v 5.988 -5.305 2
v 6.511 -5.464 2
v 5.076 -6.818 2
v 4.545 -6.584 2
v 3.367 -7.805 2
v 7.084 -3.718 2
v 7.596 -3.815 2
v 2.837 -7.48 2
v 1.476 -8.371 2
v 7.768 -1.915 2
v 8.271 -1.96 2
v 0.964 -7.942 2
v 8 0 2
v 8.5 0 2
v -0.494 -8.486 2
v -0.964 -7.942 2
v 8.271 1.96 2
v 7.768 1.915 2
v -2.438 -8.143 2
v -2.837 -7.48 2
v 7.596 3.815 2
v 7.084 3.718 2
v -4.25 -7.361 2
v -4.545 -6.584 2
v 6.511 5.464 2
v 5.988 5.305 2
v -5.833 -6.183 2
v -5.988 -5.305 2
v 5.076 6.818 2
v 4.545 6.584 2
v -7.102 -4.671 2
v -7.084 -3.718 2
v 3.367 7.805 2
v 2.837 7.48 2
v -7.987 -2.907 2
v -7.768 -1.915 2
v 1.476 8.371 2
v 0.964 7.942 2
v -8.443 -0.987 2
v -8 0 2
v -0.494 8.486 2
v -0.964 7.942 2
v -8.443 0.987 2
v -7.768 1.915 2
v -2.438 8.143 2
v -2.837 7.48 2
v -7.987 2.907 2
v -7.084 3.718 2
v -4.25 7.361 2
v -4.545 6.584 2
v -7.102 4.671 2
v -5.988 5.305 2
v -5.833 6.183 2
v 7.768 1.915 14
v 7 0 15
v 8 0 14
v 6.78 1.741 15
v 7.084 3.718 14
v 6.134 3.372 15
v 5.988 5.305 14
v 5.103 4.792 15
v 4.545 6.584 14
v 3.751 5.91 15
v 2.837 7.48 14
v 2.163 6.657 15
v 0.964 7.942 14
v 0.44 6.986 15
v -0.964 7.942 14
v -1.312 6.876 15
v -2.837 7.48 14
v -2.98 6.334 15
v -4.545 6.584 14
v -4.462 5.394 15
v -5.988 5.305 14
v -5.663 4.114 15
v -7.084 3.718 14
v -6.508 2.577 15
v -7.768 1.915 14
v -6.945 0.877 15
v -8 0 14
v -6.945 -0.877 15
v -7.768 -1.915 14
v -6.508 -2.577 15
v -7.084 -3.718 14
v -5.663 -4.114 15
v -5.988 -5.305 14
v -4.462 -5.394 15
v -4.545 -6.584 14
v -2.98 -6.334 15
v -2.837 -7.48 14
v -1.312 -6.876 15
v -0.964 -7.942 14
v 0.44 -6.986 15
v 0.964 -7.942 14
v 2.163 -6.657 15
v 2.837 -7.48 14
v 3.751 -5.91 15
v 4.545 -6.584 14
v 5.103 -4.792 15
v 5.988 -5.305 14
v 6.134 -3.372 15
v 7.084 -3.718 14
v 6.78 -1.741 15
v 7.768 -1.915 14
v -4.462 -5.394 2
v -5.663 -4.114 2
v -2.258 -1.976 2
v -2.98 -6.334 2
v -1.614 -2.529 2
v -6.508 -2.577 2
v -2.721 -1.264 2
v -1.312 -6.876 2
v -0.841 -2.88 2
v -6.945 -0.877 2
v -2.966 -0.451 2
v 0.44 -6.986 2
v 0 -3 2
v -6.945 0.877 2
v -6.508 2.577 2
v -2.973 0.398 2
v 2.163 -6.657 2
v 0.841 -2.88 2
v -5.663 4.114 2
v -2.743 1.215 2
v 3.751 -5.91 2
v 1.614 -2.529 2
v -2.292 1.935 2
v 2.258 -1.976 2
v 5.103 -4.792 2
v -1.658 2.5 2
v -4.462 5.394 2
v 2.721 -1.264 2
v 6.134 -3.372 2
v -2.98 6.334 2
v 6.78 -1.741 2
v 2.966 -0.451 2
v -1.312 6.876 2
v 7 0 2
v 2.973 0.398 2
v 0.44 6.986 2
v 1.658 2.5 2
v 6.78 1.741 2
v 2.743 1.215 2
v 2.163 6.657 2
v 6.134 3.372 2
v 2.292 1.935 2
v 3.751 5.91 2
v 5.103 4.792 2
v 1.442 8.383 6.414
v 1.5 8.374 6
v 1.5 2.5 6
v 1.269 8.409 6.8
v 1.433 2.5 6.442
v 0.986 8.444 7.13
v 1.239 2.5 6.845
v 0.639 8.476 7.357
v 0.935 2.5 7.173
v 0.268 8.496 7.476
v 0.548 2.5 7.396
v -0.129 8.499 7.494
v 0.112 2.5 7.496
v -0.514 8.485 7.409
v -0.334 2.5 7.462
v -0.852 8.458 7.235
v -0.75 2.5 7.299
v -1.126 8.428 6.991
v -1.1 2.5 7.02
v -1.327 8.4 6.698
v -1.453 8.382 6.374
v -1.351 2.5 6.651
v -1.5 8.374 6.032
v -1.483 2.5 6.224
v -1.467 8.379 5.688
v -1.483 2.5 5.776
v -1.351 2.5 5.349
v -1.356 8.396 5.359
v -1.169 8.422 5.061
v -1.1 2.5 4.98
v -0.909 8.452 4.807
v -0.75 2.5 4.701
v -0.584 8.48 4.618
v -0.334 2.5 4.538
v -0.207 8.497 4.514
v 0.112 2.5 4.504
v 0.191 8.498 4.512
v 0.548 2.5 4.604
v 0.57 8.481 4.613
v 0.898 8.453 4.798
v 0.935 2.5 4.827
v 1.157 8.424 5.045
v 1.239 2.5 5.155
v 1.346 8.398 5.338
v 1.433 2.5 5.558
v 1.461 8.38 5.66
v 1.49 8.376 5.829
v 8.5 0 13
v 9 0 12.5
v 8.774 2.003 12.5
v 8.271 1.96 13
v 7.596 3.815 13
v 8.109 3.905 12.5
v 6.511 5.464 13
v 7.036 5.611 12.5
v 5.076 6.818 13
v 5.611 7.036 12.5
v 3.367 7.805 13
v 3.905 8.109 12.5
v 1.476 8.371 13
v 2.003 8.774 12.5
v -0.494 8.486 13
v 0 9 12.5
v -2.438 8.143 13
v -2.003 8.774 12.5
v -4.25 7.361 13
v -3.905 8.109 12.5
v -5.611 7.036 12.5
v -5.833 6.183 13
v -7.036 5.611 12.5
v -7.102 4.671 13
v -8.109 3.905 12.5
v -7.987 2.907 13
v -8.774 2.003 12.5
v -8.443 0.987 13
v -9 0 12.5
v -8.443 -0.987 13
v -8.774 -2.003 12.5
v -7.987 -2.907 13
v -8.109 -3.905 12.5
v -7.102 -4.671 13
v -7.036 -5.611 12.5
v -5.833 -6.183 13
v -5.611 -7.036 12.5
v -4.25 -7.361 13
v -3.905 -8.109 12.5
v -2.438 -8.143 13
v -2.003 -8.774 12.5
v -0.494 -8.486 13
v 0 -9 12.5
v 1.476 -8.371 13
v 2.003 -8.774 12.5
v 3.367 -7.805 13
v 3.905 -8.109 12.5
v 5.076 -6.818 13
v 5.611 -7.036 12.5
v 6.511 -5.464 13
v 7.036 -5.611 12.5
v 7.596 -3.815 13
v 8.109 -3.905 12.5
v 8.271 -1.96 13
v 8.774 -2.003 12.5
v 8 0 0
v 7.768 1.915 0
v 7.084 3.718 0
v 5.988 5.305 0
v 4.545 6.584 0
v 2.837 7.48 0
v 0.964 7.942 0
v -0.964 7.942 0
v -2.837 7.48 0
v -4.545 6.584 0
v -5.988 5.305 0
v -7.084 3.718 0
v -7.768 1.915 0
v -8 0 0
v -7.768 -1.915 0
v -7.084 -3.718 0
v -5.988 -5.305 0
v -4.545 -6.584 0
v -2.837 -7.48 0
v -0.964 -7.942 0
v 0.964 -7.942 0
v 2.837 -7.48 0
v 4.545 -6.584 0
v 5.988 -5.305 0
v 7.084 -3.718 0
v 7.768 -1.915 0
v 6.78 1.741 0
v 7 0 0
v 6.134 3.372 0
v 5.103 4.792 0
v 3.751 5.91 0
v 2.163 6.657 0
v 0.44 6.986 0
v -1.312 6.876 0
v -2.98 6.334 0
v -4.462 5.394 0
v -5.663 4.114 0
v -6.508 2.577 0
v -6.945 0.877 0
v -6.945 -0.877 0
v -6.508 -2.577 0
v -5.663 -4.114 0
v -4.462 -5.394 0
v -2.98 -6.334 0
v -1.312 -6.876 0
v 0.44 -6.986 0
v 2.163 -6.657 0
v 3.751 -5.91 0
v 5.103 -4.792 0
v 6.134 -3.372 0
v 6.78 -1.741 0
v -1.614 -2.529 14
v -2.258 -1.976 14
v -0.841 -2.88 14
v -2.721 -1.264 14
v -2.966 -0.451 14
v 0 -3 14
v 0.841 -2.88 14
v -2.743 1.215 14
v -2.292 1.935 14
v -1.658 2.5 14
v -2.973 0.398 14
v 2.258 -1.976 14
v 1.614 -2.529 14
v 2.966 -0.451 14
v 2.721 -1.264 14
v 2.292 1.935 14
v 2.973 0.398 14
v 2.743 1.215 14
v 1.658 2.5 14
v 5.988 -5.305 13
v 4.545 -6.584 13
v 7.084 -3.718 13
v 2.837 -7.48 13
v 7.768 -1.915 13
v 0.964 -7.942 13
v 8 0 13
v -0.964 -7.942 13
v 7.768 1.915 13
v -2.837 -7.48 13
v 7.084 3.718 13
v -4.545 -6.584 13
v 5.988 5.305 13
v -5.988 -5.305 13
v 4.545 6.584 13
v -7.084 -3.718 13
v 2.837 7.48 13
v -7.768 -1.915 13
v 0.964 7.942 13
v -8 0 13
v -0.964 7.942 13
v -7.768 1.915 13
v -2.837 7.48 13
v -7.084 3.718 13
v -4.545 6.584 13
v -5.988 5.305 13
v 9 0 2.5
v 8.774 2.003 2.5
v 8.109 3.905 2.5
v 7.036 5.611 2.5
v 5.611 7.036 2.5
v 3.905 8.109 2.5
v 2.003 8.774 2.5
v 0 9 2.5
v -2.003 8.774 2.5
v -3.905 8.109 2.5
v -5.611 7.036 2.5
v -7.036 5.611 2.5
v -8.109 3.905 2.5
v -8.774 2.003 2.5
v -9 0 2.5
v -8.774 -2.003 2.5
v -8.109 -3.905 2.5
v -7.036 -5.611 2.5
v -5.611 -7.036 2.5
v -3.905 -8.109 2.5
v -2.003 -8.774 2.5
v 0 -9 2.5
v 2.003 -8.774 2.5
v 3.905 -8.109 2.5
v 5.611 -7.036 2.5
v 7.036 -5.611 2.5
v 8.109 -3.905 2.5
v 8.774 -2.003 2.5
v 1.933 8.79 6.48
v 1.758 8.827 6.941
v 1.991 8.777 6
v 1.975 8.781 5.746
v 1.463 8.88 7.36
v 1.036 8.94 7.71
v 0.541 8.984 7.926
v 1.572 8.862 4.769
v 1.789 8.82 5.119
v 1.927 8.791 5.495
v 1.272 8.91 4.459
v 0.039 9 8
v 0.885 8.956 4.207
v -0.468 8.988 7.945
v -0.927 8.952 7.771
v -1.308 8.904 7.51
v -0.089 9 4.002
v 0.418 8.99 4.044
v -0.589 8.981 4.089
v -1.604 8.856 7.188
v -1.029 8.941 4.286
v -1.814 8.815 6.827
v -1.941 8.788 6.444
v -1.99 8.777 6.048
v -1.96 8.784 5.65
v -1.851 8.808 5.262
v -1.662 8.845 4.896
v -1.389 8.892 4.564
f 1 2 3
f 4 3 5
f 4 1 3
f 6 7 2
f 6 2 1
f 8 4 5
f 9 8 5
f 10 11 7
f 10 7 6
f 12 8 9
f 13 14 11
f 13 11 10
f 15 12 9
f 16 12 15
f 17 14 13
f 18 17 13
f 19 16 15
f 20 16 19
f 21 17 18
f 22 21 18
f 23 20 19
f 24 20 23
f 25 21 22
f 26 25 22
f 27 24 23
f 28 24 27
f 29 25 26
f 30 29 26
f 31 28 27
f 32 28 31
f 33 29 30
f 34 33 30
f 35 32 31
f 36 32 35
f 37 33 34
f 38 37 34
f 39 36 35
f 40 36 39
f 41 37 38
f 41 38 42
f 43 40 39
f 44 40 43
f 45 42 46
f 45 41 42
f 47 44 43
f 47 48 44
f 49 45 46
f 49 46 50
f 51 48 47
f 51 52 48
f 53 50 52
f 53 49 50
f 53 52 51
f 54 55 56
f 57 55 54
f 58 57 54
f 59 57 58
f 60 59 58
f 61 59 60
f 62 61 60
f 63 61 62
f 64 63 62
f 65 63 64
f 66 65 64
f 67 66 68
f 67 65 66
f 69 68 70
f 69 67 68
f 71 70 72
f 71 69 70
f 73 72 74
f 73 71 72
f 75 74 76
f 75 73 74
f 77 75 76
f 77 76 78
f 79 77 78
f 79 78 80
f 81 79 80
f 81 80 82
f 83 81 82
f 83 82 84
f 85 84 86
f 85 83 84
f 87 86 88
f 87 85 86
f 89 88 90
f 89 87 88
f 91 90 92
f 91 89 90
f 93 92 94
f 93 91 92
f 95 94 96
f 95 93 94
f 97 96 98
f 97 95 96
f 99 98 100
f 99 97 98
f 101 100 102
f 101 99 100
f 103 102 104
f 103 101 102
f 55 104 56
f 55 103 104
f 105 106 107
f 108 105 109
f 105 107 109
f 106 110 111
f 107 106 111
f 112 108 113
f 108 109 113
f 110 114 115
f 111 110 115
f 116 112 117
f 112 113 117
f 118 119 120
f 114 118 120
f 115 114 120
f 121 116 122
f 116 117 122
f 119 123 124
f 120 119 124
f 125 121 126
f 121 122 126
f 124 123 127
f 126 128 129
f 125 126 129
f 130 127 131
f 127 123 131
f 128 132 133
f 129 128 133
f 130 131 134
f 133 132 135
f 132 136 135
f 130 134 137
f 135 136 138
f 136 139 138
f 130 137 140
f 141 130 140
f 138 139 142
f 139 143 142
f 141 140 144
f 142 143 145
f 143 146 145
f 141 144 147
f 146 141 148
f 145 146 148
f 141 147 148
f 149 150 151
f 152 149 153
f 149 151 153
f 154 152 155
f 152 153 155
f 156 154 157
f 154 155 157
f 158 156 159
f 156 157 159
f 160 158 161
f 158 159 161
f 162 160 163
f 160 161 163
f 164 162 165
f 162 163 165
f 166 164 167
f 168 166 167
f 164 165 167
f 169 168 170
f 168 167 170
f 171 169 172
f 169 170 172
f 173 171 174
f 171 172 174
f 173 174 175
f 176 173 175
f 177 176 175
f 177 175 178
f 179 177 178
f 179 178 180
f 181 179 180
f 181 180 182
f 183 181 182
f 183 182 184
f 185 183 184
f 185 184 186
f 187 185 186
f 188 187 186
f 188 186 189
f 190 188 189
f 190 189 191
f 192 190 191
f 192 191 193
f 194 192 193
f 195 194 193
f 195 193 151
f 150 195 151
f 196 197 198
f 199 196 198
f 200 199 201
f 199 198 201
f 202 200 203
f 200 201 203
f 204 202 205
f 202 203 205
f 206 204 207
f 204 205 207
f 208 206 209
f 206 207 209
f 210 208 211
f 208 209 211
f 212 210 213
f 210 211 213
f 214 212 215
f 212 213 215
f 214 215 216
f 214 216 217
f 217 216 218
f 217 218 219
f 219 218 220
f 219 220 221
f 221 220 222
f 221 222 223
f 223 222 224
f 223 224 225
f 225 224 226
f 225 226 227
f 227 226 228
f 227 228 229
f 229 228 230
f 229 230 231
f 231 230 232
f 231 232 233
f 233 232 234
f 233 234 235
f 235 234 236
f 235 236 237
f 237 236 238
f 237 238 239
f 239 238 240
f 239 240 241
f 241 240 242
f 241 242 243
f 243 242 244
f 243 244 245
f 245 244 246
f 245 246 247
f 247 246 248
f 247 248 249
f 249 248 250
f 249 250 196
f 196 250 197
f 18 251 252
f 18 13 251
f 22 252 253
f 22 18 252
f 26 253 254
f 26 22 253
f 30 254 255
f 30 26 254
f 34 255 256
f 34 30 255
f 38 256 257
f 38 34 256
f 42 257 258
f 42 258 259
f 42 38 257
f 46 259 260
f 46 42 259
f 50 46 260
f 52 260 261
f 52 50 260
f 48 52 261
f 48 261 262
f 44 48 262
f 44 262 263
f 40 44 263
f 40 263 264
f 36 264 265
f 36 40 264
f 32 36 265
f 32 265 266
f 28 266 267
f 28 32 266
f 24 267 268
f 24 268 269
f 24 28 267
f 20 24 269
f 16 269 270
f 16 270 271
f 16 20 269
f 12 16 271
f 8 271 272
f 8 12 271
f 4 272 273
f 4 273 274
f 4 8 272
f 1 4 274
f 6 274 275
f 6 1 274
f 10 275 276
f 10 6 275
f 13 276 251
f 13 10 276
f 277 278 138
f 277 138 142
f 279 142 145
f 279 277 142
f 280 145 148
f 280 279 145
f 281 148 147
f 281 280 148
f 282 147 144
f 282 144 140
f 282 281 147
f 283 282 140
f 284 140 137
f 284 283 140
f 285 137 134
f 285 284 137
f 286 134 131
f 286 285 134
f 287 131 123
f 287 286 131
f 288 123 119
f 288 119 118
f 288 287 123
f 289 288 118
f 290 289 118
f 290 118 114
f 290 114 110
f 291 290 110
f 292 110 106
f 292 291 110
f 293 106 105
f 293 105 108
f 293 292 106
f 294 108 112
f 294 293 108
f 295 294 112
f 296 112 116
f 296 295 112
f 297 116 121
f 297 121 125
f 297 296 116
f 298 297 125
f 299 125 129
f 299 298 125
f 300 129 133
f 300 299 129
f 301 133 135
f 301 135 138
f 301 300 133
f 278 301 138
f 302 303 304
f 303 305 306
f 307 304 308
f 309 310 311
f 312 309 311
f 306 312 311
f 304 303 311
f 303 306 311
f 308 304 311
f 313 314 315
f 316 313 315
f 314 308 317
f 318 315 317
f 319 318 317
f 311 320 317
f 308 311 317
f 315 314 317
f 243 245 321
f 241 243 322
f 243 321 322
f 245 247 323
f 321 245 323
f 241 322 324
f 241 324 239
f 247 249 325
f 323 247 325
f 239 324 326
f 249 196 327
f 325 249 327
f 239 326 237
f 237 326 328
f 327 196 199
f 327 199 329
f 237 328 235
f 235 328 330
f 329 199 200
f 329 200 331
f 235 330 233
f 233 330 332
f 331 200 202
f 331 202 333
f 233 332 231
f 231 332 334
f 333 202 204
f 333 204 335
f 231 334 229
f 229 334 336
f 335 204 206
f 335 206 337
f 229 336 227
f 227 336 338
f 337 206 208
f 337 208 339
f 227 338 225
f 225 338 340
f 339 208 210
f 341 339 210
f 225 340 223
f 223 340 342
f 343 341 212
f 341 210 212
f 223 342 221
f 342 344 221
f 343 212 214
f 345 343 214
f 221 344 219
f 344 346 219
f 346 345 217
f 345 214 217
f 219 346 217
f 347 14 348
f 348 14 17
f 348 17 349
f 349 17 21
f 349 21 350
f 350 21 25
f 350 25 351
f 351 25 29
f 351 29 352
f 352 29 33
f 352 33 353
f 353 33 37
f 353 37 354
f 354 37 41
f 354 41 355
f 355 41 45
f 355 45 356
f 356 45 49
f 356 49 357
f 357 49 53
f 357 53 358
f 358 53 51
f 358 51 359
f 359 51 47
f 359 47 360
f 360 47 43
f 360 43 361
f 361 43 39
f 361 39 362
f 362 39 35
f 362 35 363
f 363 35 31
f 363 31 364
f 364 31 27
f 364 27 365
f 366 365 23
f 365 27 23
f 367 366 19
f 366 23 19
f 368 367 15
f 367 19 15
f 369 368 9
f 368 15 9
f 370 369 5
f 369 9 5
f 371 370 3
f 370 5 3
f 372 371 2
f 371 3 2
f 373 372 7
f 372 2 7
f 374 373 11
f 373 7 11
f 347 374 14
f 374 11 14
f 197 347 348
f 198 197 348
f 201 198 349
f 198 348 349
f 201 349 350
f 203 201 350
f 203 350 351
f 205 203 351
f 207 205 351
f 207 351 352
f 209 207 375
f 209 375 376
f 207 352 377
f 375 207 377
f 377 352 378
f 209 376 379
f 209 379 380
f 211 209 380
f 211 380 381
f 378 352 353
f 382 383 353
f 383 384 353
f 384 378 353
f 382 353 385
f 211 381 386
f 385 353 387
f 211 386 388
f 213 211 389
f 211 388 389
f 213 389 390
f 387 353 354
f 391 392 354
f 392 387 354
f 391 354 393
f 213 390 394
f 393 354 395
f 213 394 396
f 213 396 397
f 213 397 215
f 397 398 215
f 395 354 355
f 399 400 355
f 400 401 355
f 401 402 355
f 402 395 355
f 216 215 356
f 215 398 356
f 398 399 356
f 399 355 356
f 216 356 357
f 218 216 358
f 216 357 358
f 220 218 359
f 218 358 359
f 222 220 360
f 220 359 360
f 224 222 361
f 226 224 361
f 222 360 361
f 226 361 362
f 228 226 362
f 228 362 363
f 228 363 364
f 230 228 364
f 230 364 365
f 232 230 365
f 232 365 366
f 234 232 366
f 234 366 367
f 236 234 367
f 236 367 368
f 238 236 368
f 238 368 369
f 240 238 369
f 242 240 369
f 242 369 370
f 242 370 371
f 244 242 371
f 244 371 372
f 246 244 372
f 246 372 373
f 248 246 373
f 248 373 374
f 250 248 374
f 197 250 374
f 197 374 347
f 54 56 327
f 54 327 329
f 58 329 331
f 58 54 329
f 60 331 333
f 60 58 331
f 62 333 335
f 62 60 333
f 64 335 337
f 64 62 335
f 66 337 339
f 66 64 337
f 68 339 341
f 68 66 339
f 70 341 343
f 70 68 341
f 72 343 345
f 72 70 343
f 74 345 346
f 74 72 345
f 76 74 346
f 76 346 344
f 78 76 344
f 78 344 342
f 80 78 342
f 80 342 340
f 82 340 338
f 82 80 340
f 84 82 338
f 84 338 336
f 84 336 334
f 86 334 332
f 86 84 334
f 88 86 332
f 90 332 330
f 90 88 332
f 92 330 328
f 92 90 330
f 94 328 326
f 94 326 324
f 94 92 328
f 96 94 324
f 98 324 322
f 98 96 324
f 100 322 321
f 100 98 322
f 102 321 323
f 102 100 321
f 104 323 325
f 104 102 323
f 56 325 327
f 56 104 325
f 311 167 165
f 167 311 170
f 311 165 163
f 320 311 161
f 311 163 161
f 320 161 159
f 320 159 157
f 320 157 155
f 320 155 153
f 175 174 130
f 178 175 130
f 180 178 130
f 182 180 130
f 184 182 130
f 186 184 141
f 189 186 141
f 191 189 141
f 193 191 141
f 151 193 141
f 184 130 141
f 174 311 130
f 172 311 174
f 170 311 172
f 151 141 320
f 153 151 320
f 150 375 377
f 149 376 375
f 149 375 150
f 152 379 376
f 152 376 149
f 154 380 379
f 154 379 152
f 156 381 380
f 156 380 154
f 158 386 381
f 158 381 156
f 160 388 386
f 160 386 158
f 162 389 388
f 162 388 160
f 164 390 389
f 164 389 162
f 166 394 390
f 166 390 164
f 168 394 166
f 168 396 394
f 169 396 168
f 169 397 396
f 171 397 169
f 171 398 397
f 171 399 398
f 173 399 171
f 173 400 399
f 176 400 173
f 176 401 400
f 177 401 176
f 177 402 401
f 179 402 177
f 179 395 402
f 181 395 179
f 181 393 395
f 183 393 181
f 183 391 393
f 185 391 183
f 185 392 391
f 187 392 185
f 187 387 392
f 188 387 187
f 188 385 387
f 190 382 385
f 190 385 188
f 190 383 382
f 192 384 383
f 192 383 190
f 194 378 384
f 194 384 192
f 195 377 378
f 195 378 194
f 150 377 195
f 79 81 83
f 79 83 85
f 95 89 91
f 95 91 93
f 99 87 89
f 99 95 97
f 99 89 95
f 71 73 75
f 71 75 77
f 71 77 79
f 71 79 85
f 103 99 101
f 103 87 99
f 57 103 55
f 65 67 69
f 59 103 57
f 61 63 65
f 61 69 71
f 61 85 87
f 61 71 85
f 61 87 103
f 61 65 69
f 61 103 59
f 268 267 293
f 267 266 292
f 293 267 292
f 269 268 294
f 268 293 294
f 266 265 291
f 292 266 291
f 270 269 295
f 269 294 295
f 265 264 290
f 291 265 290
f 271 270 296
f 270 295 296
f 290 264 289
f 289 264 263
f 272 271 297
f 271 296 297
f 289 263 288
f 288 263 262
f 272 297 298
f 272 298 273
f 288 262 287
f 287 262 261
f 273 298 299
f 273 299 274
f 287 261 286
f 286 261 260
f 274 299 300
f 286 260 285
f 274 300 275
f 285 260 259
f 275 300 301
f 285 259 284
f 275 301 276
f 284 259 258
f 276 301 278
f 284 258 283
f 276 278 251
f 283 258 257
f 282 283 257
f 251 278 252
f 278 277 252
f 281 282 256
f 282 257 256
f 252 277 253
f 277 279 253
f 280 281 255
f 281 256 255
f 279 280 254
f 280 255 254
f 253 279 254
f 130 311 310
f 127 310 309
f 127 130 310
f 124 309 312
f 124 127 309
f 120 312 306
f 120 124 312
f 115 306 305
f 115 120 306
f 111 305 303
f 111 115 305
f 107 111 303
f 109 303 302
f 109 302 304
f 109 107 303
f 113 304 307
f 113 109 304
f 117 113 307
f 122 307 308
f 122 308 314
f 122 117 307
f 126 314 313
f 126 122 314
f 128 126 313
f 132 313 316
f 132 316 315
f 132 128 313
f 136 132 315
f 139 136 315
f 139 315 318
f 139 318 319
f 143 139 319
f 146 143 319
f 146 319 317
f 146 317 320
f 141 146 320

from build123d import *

# Parameters (mm, degrees)
SKETCH_R        = 9
PAD_DEPTH       = 15
POCKET_DEPTH    = 14
SKETCH002_R     = 7
POCKET001_DEPTH = 2
SKETCH003_R     = 1.5
POCKET002_DEPTH = 9.001
SKETCH004_W     = 1
SKETCH004_H     = 2
CHAMFER_SIZE    = 1
CHAMFER001_SIZE = 0.5


with BuildPart() as part:
    # Sketch → Pad (new body)
    with BuildSketch(Plane.XY):
        Circle(SKETCH_R)
    extrude(amount=PAD_DEPTH)

    # Sketch001 → Pocket (cut)
    with BuildSketch(Plane.XY):
        with BuildLine():
            ThreePointArc((-1.658312, 2.5), (0, -3), (1.658312, 2.5))
            Line((-1.658312, 2.5), (1.658312, 2.5))
        make_face()
    extrude(amount=POCKET_DEPTH, mode=Mode.SUBTRACT)

    # Sketch002 → Pocket001 (cut)
    with BuildSketch(Plane.XY):
        Circle(SKETCH002_R)
    extrude(amount=POCKET001_DEPTH, mode=Mode.SUBTRACT)

    # Sketch003 → Pocket002 (cut, through all)
    with BuildSketch(Plane.XZ):
        with Locations((0, 6)):
            Circle(SKETCH003_R)
    extrude(amount=-POCKET002_DEPTH, mode=Mode.SUBTRACT)

    # Sketch004 → Groove (revolve, cut)
    with BuildSketch(Plane.XZ):
        with Locations((8.5, 14)):
            Rectangle(SKETCH004_W, SKETCH004_H)
        with Locations((8.5, 1)):
            Rectangle(SKETCH004_W, SKETCH004_H)
    revolve(axis=Axis((0, 0, 0), (0, 0, 1)), mode=Mode.SUBTRACT)

    # Chamfer
    chamfer_edges = [part.edges().sort_by_distance(p)[0] for p in [
        (-8, 0, 15),
    ]]
    chamfer(chamfer_edges, length=CHAMFER_SIZE)

    # Chamfer001
    chamfer001_edges = [part.edges().sort_by_distance(p)[0] for p in [
        (-9, 0, 2),
        (9, 0, 7.5),
        (-9, 0, 13),
        (-1.5, 8.87412, 6),
    ]]
    chamfer(chamfer001_edges, length=CHAMFER001_SIZE)


solid = part.part
